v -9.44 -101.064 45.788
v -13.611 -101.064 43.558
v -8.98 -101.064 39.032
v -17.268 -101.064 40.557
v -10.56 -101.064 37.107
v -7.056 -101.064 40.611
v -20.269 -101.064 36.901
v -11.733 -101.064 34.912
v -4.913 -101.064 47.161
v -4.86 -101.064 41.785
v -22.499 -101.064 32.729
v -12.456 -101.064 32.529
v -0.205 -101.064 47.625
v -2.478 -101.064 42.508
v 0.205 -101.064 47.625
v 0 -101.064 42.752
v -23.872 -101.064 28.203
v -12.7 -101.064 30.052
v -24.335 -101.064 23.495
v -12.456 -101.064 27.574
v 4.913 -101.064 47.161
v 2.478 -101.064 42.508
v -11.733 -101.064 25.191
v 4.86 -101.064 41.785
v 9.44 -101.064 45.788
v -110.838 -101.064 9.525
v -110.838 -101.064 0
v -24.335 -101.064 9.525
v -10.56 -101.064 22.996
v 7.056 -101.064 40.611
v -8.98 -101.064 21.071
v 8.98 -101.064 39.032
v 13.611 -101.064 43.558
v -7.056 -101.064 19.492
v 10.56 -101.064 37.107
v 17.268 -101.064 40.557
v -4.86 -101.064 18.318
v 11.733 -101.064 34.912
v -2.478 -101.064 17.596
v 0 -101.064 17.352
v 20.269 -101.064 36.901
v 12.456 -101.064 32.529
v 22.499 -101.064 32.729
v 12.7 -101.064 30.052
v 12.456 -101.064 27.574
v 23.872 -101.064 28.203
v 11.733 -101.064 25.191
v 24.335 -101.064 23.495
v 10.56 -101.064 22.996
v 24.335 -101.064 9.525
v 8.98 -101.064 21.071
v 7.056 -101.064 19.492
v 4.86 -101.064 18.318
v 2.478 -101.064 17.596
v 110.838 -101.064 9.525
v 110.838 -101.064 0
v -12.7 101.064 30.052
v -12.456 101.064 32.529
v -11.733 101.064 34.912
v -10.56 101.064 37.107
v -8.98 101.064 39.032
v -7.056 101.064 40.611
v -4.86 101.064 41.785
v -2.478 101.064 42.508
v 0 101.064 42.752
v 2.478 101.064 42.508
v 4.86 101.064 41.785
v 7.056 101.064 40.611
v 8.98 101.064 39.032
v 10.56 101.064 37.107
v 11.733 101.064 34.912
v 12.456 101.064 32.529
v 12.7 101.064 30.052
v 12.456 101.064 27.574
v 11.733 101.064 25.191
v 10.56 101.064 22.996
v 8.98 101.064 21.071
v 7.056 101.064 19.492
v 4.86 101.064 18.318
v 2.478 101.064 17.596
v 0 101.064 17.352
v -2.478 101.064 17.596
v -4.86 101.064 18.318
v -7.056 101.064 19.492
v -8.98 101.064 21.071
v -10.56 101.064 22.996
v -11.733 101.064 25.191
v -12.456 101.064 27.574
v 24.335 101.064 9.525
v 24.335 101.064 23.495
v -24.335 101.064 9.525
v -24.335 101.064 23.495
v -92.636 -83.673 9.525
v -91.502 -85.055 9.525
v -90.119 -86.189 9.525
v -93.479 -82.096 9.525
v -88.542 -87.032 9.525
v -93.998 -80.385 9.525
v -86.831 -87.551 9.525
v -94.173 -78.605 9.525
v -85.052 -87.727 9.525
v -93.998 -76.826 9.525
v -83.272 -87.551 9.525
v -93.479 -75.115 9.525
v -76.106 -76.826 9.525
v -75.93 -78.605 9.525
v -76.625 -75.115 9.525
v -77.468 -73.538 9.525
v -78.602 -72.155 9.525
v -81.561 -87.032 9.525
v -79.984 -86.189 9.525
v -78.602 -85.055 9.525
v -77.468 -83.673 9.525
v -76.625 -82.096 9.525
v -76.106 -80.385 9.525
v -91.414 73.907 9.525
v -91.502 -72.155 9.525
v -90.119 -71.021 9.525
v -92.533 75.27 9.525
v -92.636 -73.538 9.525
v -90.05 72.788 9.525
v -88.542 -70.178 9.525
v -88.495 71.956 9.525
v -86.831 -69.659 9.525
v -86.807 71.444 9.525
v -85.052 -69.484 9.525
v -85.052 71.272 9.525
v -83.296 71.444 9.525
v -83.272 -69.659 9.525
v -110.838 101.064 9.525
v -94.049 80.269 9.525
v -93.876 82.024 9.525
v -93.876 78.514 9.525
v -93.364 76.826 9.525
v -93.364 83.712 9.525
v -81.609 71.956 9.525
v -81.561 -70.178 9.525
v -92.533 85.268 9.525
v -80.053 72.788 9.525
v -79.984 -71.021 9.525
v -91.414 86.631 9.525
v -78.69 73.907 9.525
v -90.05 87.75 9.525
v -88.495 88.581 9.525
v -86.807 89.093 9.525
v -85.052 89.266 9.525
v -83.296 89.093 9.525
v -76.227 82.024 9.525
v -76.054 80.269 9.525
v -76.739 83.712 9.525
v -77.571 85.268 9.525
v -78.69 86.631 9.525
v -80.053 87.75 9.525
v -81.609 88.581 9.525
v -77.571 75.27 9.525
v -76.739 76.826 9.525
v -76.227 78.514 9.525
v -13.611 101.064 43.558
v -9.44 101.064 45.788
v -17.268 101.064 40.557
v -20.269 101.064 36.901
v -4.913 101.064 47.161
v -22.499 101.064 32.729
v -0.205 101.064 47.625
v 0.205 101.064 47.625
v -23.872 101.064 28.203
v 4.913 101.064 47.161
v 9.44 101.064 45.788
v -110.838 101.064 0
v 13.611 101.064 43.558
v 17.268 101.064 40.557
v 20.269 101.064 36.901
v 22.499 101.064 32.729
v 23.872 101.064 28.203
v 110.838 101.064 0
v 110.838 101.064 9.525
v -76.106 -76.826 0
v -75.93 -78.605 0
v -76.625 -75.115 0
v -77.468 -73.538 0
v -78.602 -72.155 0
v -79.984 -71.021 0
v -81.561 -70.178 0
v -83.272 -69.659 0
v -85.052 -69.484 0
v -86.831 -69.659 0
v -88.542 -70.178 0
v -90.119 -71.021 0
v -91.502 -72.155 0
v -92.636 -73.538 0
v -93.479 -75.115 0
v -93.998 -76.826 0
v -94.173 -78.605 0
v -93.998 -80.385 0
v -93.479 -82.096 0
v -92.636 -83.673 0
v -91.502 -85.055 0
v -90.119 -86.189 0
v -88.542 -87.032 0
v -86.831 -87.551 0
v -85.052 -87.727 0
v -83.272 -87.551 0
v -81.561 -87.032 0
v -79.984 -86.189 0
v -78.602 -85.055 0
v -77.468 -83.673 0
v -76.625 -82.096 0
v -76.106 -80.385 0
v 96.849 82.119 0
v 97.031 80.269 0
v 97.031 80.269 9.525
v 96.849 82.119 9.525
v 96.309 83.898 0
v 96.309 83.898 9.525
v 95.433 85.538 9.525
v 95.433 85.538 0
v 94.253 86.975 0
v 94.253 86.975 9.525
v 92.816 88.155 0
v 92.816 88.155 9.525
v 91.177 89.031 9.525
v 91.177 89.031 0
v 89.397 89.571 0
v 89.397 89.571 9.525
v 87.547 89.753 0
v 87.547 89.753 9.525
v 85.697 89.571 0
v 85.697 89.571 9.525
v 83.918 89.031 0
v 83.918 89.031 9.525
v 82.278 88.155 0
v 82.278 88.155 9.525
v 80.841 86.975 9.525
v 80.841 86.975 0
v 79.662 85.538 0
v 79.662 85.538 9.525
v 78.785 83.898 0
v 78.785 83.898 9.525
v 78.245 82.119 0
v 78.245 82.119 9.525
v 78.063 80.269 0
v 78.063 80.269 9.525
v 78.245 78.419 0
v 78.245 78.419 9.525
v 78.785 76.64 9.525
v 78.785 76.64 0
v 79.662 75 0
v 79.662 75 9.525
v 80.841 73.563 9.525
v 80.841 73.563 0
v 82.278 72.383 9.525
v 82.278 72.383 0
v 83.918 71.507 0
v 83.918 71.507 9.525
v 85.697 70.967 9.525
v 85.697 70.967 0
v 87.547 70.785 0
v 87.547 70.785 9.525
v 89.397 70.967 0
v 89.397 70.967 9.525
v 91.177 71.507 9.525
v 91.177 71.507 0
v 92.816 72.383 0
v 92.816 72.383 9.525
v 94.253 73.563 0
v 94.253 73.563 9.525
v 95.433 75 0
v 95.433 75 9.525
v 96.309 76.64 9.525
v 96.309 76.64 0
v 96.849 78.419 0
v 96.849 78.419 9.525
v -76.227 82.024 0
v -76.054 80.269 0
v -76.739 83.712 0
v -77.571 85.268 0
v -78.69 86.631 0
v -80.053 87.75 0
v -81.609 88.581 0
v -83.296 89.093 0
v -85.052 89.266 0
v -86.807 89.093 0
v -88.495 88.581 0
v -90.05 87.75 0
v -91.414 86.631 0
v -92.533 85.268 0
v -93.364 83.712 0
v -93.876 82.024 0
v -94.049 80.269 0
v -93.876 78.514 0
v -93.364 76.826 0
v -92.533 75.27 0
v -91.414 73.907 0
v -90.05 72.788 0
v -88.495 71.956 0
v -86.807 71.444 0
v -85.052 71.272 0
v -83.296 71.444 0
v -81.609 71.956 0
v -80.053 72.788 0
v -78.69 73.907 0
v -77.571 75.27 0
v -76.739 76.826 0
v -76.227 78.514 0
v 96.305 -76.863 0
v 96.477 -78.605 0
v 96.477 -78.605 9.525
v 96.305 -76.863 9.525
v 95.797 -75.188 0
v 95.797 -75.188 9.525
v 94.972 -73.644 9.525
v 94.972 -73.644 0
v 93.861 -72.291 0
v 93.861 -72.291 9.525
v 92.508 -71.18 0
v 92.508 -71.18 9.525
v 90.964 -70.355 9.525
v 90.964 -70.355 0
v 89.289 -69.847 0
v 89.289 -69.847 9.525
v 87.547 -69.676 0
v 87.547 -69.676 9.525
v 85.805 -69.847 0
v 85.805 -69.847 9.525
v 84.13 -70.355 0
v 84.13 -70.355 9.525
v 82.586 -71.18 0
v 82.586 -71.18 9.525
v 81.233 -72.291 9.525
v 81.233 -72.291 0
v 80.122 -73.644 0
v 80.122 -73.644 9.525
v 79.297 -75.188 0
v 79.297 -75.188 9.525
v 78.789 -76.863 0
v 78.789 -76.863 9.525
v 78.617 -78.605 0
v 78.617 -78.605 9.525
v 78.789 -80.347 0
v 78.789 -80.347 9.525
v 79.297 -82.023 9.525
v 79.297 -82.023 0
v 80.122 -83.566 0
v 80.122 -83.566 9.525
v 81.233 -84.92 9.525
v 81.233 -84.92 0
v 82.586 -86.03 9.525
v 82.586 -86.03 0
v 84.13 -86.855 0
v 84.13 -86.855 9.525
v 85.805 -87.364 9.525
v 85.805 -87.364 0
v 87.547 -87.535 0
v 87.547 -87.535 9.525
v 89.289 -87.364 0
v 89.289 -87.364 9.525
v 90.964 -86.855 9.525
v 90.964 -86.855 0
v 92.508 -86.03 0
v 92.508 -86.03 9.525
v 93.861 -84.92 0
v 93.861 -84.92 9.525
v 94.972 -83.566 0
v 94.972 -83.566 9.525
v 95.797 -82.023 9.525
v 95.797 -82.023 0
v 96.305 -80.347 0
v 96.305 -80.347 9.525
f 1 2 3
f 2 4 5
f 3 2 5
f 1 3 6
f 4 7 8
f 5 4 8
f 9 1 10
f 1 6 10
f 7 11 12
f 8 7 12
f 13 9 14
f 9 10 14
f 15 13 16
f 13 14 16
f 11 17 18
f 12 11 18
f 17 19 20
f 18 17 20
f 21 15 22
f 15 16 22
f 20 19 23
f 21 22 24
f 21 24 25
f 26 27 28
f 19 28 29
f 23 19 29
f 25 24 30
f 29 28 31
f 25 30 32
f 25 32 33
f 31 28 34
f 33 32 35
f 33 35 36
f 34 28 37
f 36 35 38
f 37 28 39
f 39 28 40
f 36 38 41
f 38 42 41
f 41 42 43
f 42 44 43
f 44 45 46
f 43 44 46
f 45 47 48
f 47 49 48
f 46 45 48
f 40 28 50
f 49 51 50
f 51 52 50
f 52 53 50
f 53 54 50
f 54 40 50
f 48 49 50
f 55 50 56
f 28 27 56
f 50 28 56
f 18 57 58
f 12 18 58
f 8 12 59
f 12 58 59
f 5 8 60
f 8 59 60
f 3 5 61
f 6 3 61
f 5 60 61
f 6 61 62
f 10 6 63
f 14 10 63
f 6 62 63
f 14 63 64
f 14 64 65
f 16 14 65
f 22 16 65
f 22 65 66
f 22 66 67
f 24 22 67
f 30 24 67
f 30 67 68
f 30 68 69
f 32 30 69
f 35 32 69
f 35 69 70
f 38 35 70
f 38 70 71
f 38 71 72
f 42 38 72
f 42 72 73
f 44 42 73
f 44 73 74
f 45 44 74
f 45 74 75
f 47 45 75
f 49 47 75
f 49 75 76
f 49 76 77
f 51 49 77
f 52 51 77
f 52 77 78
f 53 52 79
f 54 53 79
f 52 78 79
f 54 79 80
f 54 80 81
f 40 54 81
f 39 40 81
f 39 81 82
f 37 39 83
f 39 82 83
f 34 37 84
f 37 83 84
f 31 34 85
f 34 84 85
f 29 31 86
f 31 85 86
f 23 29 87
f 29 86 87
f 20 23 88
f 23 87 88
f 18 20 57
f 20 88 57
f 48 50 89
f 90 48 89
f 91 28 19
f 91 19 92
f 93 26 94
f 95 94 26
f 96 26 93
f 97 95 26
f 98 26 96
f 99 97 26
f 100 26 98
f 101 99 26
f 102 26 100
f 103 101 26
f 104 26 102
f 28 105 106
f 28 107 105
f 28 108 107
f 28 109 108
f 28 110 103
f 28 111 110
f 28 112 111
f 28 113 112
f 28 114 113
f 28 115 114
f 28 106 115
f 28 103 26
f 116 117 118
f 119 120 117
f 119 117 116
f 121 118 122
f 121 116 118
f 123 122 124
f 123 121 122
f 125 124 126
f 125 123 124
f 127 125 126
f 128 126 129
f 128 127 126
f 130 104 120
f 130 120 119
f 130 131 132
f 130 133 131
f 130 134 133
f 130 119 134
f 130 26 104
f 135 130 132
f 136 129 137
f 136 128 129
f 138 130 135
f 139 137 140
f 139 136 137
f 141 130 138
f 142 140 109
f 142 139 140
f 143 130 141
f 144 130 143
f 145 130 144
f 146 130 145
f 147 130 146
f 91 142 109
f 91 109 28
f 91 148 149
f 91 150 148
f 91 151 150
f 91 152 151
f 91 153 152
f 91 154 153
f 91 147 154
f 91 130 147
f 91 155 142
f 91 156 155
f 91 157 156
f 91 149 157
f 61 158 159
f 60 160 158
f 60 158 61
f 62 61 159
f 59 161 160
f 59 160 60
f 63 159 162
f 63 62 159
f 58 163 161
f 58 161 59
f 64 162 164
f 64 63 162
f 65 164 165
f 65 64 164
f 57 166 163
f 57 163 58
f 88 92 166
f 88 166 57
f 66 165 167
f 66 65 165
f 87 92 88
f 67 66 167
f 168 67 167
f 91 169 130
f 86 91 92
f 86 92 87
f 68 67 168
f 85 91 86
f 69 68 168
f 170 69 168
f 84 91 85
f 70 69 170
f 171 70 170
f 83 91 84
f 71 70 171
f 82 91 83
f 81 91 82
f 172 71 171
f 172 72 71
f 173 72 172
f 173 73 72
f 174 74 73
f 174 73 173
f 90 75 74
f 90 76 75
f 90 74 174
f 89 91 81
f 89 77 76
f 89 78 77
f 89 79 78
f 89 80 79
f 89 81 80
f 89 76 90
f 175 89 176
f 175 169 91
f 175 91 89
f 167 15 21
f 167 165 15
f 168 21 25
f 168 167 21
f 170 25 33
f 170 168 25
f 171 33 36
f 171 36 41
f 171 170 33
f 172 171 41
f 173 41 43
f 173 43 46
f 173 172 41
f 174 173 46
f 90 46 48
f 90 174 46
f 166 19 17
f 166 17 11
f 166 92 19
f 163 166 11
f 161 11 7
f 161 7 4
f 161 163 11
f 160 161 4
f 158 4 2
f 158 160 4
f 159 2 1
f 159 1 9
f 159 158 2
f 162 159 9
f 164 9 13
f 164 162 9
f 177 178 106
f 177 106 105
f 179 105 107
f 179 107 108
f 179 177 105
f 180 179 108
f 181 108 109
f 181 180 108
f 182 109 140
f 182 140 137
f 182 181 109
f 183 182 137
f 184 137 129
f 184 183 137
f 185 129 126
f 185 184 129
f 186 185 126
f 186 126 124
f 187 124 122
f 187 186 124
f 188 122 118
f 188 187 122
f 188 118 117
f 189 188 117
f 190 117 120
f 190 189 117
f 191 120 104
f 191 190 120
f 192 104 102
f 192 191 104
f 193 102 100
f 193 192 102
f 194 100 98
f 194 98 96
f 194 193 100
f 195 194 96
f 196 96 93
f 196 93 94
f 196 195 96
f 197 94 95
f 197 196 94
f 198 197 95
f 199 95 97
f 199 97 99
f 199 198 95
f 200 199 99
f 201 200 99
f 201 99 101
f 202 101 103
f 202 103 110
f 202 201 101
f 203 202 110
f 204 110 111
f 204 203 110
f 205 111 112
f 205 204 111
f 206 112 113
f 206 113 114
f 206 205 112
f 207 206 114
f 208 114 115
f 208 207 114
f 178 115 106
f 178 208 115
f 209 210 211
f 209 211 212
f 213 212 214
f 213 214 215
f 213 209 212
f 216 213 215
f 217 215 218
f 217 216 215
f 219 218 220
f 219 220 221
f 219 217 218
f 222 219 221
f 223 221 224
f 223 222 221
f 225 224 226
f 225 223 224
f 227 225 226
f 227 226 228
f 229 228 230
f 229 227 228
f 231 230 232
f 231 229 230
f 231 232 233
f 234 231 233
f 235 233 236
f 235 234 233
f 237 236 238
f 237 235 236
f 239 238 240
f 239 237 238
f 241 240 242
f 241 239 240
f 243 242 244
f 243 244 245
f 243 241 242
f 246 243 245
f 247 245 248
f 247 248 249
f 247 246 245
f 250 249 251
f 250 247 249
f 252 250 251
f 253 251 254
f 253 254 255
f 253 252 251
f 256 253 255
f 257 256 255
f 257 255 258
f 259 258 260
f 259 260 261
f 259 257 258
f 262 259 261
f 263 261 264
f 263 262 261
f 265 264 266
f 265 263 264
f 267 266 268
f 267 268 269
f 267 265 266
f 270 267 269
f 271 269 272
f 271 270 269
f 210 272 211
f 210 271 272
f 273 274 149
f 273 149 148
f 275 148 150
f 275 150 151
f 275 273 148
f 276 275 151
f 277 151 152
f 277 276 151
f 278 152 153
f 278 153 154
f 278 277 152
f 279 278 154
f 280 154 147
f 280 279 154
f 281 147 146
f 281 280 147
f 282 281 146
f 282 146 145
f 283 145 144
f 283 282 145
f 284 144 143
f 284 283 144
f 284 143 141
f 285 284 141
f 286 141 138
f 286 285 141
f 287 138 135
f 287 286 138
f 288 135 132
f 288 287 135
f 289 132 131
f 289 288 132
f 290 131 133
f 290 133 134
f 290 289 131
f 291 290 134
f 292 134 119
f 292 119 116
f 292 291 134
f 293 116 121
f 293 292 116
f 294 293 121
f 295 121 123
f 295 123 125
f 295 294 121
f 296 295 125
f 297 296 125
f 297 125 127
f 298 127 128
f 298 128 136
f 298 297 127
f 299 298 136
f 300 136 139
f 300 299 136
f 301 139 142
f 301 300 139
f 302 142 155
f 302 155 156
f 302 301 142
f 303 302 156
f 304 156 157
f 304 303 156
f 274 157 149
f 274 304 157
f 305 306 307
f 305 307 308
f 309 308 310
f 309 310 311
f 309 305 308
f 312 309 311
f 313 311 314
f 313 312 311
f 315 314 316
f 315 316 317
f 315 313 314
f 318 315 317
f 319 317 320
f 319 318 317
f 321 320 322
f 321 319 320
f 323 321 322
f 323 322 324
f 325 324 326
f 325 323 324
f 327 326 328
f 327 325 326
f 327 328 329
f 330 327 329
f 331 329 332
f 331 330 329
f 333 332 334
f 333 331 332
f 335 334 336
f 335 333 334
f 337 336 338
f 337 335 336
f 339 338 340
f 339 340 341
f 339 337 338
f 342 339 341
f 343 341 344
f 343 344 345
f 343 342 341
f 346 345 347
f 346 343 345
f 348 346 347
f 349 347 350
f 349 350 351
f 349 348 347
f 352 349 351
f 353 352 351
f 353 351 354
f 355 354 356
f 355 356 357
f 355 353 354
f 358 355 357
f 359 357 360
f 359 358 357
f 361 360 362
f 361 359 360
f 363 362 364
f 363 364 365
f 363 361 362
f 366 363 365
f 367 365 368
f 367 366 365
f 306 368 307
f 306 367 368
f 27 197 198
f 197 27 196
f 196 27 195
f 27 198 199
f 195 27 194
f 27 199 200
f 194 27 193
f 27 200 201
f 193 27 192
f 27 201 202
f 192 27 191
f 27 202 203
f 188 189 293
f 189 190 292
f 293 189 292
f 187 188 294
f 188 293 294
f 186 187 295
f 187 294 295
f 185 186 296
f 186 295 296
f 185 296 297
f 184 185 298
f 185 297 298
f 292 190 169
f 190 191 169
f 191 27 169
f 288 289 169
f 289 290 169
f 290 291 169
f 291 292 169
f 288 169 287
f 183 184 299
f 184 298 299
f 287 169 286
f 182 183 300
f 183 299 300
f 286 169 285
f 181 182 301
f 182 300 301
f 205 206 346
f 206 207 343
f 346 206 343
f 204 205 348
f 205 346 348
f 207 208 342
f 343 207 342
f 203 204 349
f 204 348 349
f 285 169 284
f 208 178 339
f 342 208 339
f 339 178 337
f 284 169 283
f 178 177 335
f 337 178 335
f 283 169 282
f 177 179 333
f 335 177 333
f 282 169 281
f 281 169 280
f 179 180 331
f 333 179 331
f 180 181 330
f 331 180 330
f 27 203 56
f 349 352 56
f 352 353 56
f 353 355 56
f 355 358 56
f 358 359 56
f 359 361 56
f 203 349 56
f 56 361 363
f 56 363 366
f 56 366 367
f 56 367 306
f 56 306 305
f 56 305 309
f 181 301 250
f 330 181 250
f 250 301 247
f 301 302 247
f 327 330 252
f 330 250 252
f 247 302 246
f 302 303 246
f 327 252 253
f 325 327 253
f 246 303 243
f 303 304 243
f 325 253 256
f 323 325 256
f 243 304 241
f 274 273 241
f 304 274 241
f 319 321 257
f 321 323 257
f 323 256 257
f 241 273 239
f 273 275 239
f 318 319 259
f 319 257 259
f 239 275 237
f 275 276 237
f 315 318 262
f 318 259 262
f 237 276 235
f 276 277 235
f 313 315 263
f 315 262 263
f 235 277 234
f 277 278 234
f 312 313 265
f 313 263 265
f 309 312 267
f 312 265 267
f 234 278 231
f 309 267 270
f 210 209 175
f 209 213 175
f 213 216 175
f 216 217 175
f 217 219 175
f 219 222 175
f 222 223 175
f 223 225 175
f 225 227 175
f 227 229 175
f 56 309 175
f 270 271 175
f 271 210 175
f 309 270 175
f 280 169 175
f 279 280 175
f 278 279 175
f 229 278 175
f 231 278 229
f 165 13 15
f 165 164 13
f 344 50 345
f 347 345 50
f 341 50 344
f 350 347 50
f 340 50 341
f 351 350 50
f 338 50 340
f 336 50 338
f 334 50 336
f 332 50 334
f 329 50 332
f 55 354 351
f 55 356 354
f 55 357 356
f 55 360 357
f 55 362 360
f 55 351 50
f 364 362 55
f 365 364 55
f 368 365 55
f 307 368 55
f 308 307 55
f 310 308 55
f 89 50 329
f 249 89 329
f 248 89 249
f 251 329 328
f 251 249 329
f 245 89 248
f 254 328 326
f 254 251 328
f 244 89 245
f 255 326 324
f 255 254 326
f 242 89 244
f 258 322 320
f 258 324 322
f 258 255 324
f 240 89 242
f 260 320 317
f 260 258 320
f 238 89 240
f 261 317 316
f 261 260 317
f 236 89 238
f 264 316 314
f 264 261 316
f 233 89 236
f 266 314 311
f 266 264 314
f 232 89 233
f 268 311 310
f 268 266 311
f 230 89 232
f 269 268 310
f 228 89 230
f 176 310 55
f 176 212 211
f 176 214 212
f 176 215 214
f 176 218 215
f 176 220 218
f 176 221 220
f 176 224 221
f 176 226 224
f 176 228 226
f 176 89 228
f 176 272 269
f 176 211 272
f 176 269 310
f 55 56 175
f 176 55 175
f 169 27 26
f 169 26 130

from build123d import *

# Parameters (mm, degrees)
F0_W     = 221.675306
F0_H     = 202.127948
F0_R     = 9.121421
F0_R_2   = 8.929781
F0_R_3   = 8.997318
F0_R_4   = 9.484007
F1_DEPTH = 9.525
F2_W     = 48.670978
F2_H     = 202.127948
F3_DEPTH = 38.1
F5_D     = 25.4
F6_R     = 24.13


with BuildPart() as f1:
    # F0 (on Top) → F1 (new body)
    with BuildSketch(Plane.XY):
        Rectangle(F0_W, F0_H)
        with Locations((-85.051782, -78.605309)):
            Circle(F0_R, mode=Mode.SUBTRACT)
        with Locations((87.547183, -78.605309)):
            Circle(F0_R_2, mode=Mode.SUBTRACT)
        with Locations((-85.051782, 80.268927)):
            Circle(F0_R_3, mode=Mode.SUBTRACT)
        with Locations((87.547183, 80.268927)):
            Circle(F0_R_4, mode=Mode.SUBTRACT)
    extrude(amount=F1_DEPTH)

    # F2 (on face) → F3 (join)
    with BuildSketch(Plane.XY.offset(9.525)):
        Rectangle(F2_W, F2_H)
    extrude(amount=F3_DEPTH)

    # F5 (through all)
    with Locations(Plane.XZ.offset(101.063974)):
        with Locations((0, 30.051572)):
            Hole(F5_D / 2)

    # F6
    f6_edges = [f1.edges().sort_by_distance(p)[0] for p in [
        (-24.335489, 0, 47.625),
        (24.335489, 0, 47.625),
    ]]
    fillet(f6_edges, radius=F6_R)


solid = f1.part
